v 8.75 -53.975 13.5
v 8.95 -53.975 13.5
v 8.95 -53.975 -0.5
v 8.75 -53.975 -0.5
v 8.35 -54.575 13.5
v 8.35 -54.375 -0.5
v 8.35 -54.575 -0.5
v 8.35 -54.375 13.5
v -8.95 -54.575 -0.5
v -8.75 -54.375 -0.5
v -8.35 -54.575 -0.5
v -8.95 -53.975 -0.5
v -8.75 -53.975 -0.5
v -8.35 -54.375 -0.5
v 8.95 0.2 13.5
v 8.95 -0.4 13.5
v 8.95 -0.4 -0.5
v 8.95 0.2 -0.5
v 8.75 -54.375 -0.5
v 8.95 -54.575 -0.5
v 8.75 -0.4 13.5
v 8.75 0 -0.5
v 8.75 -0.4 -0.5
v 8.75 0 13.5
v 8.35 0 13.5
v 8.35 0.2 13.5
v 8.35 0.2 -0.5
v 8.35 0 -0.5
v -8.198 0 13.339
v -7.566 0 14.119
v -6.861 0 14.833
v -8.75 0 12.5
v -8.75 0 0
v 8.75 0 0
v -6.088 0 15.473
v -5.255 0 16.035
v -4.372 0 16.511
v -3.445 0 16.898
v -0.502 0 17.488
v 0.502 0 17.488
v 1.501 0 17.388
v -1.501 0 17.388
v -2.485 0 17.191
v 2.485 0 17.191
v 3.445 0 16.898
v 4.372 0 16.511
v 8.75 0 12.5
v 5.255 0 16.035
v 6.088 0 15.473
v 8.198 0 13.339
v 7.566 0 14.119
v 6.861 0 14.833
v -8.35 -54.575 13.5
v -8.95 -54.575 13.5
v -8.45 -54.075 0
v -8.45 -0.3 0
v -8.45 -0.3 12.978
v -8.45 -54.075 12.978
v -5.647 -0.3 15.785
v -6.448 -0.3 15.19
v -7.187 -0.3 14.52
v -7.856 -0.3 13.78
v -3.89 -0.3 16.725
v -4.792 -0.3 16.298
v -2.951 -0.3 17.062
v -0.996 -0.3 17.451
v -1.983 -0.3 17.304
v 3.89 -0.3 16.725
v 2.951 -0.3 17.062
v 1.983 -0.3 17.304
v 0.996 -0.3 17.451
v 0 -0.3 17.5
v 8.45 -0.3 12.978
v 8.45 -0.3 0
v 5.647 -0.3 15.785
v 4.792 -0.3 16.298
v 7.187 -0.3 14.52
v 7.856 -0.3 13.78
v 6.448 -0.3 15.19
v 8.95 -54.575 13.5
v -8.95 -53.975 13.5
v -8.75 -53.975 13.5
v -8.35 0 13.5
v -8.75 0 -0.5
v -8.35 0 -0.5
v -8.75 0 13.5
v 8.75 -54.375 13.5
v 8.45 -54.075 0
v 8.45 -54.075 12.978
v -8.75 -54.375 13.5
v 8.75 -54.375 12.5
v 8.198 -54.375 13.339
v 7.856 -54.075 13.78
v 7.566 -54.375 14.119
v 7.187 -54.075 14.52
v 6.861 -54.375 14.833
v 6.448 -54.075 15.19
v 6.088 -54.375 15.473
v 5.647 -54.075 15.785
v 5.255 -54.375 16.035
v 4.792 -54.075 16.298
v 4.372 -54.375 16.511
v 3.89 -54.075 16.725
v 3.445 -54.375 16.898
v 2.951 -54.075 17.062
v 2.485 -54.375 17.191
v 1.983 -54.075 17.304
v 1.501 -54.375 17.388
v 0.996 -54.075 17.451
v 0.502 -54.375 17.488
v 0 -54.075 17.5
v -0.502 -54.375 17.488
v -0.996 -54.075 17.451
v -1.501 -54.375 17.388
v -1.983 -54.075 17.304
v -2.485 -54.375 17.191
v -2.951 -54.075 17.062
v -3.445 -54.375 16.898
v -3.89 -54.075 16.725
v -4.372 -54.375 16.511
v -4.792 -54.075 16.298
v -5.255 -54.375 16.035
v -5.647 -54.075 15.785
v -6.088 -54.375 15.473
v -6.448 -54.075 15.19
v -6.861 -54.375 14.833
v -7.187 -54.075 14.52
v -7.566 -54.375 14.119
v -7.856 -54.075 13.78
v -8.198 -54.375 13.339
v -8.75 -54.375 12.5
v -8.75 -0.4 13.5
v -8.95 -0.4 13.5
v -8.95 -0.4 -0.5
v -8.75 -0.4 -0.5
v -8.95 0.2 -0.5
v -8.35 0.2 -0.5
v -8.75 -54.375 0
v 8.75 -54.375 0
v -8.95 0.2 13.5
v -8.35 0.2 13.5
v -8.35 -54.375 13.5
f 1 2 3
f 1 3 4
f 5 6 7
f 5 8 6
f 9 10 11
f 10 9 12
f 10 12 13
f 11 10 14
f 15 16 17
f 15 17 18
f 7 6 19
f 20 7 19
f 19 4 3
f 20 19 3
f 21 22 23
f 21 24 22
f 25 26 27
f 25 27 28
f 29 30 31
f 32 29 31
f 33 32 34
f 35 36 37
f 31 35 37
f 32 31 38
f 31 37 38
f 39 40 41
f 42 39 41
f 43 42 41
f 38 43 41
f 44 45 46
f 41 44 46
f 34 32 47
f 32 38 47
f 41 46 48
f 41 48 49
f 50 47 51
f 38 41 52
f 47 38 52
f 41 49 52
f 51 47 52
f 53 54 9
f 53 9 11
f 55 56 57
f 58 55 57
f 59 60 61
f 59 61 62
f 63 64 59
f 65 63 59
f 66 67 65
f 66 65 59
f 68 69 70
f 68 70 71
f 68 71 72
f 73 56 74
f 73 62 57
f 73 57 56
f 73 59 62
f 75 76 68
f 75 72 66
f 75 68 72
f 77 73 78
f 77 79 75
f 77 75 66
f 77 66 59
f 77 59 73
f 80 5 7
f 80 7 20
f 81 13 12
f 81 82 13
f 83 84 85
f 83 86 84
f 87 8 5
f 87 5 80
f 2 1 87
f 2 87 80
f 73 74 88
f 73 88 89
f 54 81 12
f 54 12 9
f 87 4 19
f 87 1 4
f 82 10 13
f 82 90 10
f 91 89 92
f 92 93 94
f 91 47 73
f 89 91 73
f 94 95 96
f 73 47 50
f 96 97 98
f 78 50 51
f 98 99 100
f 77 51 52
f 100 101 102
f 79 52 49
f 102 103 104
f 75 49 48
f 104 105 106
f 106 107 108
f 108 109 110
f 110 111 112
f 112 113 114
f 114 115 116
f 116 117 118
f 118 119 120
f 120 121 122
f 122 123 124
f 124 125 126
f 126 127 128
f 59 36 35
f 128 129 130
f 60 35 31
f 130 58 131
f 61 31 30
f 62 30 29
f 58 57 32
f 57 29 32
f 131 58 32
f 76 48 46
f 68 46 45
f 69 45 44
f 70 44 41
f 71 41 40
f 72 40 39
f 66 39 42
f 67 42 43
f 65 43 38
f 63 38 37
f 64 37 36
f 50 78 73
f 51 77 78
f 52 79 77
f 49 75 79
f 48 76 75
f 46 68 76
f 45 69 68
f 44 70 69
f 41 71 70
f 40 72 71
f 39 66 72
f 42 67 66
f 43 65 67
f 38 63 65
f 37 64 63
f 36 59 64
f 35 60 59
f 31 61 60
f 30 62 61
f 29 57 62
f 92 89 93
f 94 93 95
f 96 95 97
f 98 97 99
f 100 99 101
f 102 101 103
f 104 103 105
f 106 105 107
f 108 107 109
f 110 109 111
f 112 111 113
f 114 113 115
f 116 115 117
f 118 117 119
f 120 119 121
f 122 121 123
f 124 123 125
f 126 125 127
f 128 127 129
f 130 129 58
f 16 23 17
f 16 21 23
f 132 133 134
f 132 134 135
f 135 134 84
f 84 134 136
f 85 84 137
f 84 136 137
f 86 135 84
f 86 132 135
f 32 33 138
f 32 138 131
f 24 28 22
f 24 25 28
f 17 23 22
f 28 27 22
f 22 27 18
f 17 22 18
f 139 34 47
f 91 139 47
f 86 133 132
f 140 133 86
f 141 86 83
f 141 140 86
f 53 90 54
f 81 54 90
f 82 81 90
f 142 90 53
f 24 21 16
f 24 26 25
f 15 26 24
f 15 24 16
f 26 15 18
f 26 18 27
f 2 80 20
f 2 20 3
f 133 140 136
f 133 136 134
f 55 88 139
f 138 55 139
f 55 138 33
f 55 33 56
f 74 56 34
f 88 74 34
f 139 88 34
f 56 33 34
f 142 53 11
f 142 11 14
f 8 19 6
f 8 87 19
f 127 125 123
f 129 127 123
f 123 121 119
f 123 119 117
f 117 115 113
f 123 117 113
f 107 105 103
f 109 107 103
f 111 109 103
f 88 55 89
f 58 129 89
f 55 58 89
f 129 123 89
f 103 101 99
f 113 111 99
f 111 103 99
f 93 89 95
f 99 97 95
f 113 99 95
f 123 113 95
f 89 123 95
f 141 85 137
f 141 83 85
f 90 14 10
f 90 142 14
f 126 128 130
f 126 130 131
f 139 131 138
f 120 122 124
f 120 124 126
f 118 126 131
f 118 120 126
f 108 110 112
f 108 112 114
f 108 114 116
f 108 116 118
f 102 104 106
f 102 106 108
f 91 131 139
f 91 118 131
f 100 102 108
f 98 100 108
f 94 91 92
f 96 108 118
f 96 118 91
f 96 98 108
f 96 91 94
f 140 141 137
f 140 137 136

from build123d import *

# Parameters (mm, degrees)
F0_W          = 17.5
F0_H          = 12.5
F1_DEPTH      = 54.375
F2_T          = -0.3
F4_DEPTH      = 13.5
F4_DEPTH_BACK = 0.5


with BuildPart() as f1:
    # F0 (on Front) → F1 (new body)
    with BuildSketch(Plane.XZ):
        with Locations((0, 6.25)):
            Rectangle(F0_W, F0_H)
        with BuildLine():
            ThreePointArc((8.75, 12.5), (0, 17.5), (-8.75, 12.5))
            Line((-8.75, 12.5), (8.75, 12.5))
        make_face()
    extrude(amount=F1_DEPTH)

    # F2
    f2_openings = [f1.faces().sort_by_distance(p)[0] for p in [
        (0, -27.1875, 0),
        (0, -27.1875, 17.5),
    ]]
    offset(amount=F2_T, openings=f2_openings)


with BuildPart() as f4:
    # F3 (on Top) → F4 (new body, two sides)
    with BuildSketch(Plane.XY) as f4_sk:
        Polygon((-8.35, 0), (-8.35, 0.2), (-8.95, 0.2), (-8.95, -0.4), (-8.75, -0.4), (-8.75, 0), align=None)
        Polygon((8.75, -0.4), (8.95, -0.4), (8.95, 0.2), (8.35, 0.2), (8.35, 0), (8.75, 0), align=None)
        Polygon((-8.75, -53.975), (-8.95, -53.975), (-8.95, -54.575), (-8.35, -54.575), (-8.35, -54.375), (-8.75, -54.375), align=None)
        Polygon((8.35, -54.375), (8.35, -54.575), (8.95, -54.575), (8.95, -53.975), (8.75, -53.975), (8.75, -54.375), align=None)
    extrude(amount=F4_DEPTH)
    extrude(f4_sk.sketch, amount=-F4_DEPTH_BACK)


solid = Compound([f1.part, f4.part])
